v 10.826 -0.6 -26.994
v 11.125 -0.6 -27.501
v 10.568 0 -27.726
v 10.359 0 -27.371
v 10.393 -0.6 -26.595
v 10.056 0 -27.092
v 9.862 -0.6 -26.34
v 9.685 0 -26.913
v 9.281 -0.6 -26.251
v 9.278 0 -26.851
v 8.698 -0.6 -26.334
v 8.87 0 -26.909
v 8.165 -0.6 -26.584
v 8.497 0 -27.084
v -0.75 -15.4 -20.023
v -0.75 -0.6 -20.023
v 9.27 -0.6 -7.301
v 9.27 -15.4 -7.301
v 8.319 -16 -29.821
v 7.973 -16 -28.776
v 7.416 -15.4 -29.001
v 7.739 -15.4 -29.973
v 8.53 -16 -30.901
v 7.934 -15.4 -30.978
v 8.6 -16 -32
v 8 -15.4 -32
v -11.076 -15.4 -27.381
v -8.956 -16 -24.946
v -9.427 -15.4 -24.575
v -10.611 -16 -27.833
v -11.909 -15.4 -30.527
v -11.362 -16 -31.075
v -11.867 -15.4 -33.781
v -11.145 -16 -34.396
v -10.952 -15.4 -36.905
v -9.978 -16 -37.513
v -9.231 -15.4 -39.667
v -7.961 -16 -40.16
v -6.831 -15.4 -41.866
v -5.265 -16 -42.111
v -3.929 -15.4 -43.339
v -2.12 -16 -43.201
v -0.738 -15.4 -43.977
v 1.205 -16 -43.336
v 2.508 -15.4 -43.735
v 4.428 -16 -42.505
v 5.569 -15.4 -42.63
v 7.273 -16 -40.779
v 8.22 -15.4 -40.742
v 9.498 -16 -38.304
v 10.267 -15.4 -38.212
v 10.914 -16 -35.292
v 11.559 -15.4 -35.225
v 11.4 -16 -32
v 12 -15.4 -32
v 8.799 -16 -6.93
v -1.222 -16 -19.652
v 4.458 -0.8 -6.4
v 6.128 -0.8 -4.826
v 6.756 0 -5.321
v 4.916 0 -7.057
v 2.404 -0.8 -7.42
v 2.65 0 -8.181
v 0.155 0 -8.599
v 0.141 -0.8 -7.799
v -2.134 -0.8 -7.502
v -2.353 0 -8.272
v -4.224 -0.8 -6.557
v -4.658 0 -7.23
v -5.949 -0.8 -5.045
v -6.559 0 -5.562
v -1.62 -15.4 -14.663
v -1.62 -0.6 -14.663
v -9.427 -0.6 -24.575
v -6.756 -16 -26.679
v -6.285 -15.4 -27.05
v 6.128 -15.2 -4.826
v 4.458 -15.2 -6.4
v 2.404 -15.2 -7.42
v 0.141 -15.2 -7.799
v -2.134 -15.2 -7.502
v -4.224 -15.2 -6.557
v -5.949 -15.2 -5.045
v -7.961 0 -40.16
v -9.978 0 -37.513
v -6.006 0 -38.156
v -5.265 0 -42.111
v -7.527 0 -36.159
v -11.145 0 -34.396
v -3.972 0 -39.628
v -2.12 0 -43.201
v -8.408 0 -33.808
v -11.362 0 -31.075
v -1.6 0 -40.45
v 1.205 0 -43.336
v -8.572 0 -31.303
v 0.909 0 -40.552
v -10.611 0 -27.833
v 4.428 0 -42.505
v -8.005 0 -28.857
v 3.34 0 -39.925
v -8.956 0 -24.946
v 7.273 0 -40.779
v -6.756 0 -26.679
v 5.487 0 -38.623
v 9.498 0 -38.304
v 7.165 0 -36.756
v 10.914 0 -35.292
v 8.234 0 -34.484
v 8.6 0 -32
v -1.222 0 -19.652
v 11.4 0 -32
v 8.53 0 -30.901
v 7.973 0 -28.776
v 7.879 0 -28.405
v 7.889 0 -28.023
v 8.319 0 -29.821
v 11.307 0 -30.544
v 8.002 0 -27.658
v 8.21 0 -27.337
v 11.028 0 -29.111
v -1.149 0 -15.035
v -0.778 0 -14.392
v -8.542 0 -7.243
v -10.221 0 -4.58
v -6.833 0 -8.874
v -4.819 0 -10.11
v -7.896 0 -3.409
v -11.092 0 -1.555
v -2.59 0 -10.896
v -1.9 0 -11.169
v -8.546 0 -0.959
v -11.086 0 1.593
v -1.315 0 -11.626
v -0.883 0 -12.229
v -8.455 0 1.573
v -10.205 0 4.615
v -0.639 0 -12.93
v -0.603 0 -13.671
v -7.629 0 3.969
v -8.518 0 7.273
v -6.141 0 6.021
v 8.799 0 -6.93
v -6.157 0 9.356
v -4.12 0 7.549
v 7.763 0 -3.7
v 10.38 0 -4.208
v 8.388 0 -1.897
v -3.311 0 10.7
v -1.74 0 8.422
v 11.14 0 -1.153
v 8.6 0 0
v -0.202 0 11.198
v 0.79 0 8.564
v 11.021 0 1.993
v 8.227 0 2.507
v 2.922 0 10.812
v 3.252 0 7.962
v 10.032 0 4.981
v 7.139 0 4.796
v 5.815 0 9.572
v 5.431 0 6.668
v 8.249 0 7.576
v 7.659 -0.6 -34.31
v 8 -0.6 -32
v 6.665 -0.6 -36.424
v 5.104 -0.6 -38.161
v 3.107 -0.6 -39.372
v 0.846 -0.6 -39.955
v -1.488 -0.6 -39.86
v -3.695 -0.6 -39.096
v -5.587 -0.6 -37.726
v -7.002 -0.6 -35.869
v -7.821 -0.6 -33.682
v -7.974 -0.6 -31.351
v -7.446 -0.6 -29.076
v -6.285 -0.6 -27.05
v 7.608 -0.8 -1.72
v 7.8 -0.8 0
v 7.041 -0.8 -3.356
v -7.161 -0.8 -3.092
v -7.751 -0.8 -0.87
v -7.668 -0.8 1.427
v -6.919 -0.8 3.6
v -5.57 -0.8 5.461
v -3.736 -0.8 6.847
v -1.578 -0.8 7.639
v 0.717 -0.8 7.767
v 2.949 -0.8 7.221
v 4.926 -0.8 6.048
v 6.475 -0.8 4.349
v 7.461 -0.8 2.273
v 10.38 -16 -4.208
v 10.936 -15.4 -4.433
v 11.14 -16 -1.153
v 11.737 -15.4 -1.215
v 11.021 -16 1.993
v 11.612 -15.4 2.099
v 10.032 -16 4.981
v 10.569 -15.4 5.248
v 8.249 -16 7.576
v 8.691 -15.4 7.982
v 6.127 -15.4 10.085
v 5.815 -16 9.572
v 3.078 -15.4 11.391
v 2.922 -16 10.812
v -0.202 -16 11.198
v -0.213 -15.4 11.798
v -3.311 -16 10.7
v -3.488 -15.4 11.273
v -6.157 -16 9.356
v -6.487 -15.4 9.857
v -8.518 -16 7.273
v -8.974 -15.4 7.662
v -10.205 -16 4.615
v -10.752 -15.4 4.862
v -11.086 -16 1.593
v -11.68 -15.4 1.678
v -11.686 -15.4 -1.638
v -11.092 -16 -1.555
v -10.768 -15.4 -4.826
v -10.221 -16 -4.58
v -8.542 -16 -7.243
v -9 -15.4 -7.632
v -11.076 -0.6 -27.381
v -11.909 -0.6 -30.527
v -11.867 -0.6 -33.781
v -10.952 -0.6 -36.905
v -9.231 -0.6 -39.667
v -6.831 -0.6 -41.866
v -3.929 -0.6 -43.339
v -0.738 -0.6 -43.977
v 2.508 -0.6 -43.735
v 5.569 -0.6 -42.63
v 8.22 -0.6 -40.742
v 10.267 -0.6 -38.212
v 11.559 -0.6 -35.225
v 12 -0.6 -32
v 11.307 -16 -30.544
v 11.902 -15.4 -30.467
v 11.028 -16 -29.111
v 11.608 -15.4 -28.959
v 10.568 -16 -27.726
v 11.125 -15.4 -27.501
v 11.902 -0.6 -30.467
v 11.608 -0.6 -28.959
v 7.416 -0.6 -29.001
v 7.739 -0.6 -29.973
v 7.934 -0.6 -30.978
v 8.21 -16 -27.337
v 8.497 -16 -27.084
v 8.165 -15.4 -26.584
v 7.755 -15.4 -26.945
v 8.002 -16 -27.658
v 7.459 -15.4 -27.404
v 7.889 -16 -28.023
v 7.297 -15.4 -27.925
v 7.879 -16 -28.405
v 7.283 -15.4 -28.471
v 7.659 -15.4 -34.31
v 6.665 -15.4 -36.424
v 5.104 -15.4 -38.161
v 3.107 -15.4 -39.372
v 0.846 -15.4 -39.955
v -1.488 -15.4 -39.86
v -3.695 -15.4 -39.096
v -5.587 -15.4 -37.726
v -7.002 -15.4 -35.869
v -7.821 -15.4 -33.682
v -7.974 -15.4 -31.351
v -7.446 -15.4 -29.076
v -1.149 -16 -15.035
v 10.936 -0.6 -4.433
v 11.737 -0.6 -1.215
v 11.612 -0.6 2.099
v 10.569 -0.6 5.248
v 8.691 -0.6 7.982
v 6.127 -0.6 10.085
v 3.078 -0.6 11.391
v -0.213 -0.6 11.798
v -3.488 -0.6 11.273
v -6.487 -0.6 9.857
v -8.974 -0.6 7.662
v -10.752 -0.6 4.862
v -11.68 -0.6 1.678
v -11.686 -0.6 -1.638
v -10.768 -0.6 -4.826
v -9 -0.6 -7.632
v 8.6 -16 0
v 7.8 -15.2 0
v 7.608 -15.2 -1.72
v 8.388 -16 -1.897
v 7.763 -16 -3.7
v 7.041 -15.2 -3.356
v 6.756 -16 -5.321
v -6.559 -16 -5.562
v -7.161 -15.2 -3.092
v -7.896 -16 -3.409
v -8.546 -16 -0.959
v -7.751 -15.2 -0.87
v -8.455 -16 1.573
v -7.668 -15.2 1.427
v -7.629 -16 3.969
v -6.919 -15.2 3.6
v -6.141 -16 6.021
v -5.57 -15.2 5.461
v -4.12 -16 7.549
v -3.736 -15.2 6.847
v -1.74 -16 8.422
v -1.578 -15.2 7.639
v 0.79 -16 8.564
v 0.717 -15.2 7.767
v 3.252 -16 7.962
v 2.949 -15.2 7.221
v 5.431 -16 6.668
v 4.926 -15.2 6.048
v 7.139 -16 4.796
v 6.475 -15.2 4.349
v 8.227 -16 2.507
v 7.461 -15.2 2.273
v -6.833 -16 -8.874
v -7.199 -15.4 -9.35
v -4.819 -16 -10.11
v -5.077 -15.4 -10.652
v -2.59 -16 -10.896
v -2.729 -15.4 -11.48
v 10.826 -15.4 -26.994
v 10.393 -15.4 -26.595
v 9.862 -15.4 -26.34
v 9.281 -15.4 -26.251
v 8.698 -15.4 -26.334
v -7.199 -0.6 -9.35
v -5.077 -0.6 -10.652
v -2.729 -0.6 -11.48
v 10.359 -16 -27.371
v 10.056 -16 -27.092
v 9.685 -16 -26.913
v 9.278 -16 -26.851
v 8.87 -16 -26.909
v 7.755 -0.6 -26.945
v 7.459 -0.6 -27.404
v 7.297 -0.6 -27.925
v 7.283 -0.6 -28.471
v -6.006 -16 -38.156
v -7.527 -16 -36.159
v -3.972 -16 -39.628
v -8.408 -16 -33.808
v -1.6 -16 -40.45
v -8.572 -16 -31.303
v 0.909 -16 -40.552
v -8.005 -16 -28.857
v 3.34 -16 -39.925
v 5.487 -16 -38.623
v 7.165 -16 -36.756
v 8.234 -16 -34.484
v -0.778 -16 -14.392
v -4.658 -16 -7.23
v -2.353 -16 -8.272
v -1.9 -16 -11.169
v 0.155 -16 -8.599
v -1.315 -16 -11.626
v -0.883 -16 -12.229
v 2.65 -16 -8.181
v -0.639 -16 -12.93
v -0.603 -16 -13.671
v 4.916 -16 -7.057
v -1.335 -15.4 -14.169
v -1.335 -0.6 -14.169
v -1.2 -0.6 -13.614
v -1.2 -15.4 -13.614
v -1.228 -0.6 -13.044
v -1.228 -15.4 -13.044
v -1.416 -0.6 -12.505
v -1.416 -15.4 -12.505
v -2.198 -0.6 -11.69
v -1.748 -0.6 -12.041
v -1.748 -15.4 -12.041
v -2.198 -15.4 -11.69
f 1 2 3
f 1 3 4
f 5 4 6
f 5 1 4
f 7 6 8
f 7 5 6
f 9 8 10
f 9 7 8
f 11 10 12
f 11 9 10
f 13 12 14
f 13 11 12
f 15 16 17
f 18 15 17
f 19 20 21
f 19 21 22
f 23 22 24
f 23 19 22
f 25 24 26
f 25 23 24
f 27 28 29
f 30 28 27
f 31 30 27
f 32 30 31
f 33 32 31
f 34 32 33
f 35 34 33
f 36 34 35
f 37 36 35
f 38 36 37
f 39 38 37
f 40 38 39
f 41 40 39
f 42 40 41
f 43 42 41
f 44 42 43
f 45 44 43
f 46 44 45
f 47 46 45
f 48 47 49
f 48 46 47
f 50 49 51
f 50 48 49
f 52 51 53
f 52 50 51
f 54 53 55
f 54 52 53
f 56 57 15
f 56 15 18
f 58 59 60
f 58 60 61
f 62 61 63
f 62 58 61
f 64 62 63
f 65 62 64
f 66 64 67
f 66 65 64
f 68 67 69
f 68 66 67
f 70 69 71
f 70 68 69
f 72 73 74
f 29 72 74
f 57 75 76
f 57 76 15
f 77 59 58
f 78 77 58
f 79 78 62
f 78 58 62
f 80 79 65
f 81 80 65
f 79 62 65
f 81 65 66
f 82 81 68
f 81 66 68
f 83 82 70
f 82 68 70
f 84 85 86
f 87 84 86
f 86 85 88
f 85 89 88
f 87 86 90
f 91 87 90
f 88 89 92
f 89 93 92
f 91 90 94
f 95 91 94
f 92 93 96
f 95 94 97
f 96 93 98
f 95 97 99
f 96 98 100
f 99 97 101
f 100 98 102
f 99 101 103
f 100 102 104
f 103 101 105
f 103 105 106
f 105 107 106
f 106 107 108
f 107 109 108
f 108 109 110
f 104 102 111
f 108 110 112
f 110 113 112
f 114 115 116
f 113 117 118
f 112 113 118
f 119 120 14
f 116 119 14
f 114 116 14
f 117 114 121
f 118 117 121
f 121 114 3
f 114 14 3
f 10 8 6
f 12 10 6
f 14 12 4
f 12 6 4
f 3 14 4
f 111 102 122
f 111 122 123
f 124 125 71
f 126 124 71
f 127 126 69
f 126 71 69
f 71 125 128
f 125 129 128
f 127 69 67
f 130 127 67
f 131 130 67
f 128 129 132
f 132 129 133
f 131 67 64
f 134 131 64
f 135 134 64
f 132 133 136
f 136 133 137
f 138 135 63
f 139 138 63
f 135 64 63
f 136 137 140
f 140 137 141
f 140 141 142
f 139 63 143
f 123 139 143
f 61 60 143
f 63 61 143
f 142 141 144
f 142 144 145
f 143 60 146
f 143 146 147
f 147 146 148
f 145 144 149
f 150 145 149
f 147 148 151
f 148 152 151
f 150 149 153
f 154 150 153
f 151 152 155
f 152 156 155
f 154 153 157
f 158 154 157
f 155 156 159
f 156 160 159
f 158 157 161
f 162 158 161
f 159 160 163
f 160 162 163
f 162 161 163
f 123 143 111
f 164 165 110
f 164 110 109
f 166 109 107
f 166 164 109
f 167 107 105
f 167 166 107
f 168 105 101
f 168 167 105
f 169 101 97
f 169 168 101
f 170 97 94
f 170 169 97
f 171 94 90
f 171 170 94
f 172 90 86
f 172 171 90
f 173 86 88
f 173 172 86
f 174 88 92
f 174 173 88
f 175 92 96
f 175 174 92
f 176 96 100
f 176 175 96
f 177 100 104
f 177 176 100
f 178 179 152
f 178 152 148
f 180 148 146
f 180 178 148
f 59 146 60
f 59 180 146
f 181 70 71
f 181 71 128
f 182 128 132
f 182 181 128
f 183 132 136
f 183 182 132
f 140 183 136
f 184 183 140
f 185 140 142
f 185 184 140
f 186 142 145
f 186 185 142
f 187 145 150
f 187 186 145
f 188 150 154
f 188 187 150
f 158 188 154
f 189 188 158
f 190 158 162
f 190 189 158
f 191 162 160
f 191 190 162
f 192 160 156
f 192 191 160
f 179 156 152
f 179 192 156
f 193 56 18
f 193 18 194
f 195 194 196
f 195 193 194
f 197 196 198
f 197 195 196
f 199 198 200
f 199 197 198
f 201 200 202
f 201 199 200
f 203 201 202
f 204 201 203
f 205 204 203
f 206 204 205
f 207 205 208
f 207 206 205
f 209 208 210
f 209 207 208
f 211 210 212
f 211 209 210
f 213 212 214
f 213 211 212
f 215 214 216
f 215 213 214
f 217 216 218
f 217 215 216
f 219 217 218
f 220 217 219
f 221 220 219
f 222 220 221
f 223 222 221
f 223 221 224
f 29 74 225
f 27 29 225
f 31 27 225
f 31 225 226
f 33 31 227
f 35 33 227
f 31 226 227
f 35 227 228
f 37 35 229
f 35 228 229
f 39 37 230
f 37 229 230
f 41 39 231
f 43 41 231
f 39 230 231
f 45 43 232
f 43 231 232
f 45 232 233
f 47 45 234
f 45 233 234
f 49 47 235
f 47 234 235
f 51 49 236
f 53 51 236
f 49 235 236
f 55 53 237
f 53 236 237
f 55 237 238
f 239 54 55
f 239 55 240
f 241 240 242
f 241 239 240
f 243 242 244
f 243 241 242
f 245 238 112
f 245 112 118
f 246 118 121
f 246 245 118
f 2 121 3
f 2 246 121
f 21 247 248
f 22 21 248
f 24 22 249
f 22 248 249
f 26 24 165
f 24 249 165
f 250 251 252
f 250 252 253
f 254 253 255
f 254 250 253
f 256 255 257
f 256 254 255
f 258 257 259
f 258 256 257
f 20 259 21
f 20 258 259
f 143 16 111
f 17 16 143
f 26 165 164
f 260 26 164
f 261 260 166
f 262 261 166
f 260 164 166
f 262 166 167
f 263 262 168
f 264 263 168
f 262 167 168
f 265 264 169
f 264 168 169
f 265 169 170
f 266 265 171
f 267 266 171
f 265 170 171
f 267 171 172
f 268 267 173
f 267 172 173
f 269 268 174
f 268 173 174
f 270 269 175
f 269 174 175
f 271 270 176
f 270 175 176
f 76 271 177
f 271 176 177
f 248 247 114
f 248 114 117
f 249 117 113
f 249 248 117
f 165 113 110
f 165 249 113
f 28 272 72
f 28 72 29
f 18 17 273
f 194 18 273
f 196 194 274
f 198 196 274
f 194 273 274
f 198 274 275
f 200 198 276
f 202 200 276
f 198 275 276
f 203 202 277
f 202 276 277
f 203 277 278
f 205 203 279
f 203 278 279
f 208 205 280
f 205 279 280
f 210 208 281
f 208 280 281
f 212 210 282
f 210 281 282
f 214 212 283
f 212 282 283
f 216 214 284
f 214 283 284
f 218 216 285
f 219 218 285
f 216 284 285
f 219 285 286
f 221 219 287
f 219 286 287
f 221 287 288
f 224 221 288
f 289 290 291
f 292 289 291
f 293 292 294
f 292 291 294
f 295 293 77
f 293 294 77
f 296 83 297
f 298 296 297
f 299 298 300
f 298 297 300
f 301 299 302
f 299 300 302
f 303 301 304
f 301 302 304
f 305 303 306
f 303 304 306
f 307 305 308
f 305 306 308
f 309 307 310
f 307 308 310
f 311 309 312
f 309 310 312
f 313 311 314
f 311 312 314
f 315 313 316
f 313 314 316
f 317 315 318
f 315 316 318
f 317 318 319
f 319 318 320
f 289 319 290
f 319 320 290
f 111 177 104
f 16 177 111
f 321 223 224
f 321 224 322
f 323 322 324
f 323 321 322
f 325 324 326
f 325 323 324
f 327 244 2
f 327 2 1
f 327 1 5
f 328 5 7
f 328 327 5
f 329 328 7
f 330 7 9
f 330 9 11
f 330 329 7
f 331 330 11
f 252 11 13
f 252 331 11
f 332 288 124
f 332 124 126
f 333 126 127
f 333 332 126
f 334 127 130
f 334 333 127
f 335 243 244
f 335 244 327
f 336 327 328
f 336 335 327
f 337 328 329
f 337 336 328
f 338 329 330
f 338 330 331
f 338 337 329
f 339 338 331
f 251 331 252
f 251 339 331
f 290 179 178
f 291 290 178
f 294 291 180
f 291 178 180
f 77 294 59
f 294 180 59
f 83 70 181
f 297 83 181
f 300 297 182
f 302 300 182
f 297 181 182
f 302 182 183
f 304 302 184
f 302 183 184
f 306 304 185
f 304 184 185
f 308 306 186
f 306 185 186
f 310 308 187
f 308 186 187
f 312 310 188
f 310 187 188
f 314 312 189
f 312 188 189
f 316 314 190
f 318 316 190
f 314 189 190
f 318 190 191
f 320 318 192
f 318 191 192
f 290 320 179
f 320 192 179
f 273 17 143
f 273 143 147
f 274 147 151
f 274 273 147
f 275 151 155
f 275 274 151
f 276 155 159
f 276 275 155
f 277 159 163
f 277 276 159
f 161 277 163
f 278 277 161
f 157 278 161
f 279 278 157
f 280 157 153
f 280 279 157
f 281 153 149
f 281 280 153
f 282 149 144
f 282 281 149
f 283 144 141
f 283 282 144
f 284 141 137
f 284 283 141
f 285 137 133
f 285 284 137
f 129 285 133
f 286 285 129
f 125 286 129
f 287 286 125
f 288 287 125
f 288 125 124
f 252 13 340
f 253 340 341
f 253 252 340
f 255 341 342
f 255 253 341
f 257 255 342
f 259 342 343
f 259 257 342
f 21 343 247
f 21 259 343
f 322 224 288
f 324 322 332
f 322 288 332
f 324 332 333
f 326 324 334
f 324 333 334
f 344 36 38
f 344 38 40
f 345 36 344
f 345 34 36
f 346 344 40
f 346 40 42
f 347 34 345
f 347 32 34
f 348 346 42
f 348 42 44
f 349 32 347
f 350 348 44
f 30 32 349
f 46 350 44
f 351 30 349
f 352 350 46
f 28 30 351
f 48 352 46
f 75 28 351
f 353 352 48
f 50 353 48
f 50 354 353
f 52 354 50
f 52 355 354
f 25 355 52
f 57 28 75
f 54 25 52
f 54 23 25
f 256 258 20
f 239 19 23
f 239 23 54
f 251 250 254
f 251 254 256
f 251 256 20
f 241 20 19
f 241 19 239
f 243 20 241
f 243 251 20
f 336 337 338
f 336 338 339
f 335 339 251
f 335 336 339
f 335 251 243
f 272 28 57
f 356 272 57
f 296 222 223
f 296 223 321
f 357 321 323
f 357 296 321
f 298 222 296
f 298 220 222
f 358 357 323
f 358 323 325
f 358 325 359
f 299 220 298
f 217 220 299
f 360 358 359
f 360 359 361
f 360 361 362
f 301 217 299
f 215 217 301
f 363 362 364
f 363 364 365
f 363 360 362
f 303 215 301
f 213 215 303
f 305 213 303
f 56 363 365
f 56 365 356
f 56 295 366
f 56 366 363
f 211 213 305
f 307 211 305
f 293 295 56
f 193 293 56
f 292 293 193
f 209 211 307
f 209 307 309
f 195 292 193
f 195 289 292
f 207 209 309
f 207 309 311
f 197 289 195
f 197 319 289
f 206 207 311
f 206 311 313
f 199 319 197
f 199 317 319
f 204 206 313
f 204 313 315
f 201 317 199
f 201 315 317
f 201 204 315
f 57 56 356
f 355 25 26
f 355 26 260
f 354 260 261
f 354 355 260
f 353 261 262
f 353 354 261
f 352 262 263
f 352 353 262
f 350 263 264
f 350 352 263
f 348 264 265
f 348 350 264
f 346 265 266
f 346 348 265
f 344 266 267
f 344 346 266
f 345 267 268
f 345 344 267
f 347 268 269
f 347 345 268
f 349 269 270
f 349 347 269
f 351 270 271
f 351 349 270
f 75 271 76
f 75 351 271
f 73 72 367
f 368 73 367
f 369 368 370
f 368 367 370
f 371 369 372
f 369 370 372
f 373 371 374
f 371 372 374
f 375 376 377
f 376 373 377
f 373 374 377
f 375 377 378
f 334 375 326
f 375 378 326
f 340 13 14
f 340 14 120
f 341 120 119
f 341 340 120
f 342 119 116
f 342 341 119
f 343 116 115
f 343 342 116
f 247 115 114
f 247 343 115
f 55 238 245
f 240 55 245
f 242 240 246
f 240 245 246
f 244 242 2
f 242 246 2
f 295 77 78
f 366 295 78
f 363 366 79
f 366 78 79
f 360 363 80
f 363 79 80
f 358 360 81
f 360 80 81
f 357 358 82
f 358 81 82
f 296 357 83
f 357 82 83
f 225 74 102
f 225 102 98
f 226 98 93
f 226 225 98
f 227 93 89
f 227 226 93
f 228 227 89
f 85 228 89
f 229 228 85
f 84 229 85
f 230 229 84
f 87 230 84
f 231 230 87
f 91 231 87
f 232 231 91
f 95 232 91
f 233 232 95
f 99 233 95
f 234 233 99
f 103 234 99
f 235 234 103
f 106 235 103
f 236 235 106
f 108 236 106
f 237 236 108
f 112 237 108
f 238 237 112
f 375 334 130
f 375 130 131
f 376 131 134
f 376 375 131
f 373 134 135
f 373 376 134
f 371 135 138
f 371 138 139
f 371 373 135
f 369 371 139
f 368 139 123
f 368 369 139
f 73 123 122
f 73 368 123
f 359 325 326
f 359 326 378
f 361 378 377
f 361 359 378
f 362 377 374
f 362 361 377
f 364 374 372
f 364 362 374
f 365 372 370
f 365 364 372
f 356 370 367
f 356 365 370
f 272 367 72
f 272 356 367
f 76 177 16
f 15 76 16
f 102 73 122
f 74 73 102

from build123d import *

# Parameters (mm, degrees)
F1_DEPTH = 16
F2_R     = 1.99999
F3_SIZE  = 0.8
F4_SIZE  = 0.6


# Not quite as in the source:
# - a fillet or chamfer is up to 0.001 mm smaller than in the source, because OpenCascade refuses the exact size


with BuildPart() as f1:
    # F0 (on Front) → F1 (new body)
    with BuildSketch(Plane.XZ):
        with BuildLine():
            ThreePointArc((7.8, 0), (7.3700465154, -2.5539017916), (6.1275860612, -4.82625))
            Line((6.1275860612, -4.82625), (0.648940015, -11.7821422864))
            ThreePointArc((0.648940015, -11.7821422864), (5.4420247731, -10.4701655368), (9.2699378875, -7.30125))
            ThreePointArc((9.2699378875, -7.30125), (11.1495575489, -3.8635950181), (11.8, 0))
            ThreePointArc((11.8, 0), (-4.0644802866, 11.0779059393), (-9, -7.6315136113))
            Line((-9, -7.6315136113), (-5.9491525424, -5.0445598448))
            ThreePointArc((-5.9491525424, -5.0445598448), (-2.6866903589, 7.322683587), (7.8, 0))
        make_face()
        with BuildLine():
            ThreePointArc((9.2699378875, -7.30125), (5.4420247731, -10.4701655368), (0.648940015, -11.7821422864))
            Line((0.648940015, -11.7821422864), (-9.4270554788, -24.575))
            ThreePointArc((-9.4270554788, -24.575), (-5.5744413376, -21.3733540676), (-0.7504354082, -20.0234877073))
            Line((-0.7504354082, -20.0234877073), (9.2699378875, -7.30125))
        make_face()
        with BuildLine():
            ThreePointArc((-0.7504354082, -20.0234877073), (-5.5744413376, -21.3733540676), (-9.4270554788, -24.575))
            ThreePointArc((-9.4270554788, -24.575), (-3.9290796794, -43.3385331006), (12, -32))
            ThreePointArc((12, -32), (11.4891252931, -28.5358983849), (10, -25.3667504193))
            Line((10, -25.3667504193), (6.6666666667, -27.5778336129))
            ThreePointArc((6.6666666667, -27.5778336129), (7.6594168621, -29.6905989232), (8, -32))
            ThreePointArc((8, -32), (-2.619386453, -39.559022067), (-6.2847036525, -27.05))
            Line((-6.2847036525, -27.05), (-0.7504354082, -20.0234877073))
        make_face()
        with BuildLine():
            Line((0.648940015, -11.7821422864), (6.1275860612, -4.82625))
            ThreePointArc((6.1275860612, -4.82625), (0.1409766904, -7.7987258942), (-5.9491525424, -5.0445598448))
            Line((-5.9491525424, -5.0445598448), (-9, -7.6315136113))
            ThreePointArc((-9, -7.6315136113), (-4.6628296471, -10.8396503487), (0.648940015, -11.7821422864))
        make_face()
    extrude(amount=F1_DEPTH)

    # F2 (radius 2 in the source; OpenCascade refuses exactly that, so slightly less here)
    f2_edges = [f1.edges().sort_by_distance(p)[0] for p in [
        (6.127586, -8, -4.82625),
        (9.269938, -8, -7.30125),
        (10, -8, -25.36675),
        (6.666667, -8, -27.577834),
        (0.64894, -8, -11.782142),
    ]]
    fillet(f2_edges, radius=F2_R)

    # F3
    f3_edges = [f1.edges().sort_by_distance(p)[0] for p in [
        (-6.127586, -16, 4.82625),
        (-6.127586, 0, 4.82625),
    ]]
    chamfer(f3_edges, length=F3_SIZE)

    # F4
    f4_edges = [f1.edges().sort_by_distance(p)[0] for p in [
        (-3.880931, -16, 11.143535),
        (1.492617, 0, -17.175625),
        (-5.523718, 0, -19.619177),
        (-1.302823, 0, -12.768079),
        (-1.69128, 0, -43.880218),
        (-3.880931, 0, 11.143535),
        (9.862297, 0, -26.340194),
        (8.164968, 0, -26.583973),
        (-1.127522, 0, -39.920145),
        (7.360063, 0, -27.658852),
        (-5.523718, -16, -19.619177),
        (-1.302823, -16, -12.768079),
        (-1.69128, -16, -43.880218),
        (9.862297, -16, -26.340194),
        (1.492617, -16, -17.175625),
        (8.164968, -16, -26.583973),
        (-1.127522, -16, -39.920145),
        (7.360063, -16, -27.658852),
    ]]
    chamfer(f4_edges, length=F4_SIZE)


solid = f1.part
